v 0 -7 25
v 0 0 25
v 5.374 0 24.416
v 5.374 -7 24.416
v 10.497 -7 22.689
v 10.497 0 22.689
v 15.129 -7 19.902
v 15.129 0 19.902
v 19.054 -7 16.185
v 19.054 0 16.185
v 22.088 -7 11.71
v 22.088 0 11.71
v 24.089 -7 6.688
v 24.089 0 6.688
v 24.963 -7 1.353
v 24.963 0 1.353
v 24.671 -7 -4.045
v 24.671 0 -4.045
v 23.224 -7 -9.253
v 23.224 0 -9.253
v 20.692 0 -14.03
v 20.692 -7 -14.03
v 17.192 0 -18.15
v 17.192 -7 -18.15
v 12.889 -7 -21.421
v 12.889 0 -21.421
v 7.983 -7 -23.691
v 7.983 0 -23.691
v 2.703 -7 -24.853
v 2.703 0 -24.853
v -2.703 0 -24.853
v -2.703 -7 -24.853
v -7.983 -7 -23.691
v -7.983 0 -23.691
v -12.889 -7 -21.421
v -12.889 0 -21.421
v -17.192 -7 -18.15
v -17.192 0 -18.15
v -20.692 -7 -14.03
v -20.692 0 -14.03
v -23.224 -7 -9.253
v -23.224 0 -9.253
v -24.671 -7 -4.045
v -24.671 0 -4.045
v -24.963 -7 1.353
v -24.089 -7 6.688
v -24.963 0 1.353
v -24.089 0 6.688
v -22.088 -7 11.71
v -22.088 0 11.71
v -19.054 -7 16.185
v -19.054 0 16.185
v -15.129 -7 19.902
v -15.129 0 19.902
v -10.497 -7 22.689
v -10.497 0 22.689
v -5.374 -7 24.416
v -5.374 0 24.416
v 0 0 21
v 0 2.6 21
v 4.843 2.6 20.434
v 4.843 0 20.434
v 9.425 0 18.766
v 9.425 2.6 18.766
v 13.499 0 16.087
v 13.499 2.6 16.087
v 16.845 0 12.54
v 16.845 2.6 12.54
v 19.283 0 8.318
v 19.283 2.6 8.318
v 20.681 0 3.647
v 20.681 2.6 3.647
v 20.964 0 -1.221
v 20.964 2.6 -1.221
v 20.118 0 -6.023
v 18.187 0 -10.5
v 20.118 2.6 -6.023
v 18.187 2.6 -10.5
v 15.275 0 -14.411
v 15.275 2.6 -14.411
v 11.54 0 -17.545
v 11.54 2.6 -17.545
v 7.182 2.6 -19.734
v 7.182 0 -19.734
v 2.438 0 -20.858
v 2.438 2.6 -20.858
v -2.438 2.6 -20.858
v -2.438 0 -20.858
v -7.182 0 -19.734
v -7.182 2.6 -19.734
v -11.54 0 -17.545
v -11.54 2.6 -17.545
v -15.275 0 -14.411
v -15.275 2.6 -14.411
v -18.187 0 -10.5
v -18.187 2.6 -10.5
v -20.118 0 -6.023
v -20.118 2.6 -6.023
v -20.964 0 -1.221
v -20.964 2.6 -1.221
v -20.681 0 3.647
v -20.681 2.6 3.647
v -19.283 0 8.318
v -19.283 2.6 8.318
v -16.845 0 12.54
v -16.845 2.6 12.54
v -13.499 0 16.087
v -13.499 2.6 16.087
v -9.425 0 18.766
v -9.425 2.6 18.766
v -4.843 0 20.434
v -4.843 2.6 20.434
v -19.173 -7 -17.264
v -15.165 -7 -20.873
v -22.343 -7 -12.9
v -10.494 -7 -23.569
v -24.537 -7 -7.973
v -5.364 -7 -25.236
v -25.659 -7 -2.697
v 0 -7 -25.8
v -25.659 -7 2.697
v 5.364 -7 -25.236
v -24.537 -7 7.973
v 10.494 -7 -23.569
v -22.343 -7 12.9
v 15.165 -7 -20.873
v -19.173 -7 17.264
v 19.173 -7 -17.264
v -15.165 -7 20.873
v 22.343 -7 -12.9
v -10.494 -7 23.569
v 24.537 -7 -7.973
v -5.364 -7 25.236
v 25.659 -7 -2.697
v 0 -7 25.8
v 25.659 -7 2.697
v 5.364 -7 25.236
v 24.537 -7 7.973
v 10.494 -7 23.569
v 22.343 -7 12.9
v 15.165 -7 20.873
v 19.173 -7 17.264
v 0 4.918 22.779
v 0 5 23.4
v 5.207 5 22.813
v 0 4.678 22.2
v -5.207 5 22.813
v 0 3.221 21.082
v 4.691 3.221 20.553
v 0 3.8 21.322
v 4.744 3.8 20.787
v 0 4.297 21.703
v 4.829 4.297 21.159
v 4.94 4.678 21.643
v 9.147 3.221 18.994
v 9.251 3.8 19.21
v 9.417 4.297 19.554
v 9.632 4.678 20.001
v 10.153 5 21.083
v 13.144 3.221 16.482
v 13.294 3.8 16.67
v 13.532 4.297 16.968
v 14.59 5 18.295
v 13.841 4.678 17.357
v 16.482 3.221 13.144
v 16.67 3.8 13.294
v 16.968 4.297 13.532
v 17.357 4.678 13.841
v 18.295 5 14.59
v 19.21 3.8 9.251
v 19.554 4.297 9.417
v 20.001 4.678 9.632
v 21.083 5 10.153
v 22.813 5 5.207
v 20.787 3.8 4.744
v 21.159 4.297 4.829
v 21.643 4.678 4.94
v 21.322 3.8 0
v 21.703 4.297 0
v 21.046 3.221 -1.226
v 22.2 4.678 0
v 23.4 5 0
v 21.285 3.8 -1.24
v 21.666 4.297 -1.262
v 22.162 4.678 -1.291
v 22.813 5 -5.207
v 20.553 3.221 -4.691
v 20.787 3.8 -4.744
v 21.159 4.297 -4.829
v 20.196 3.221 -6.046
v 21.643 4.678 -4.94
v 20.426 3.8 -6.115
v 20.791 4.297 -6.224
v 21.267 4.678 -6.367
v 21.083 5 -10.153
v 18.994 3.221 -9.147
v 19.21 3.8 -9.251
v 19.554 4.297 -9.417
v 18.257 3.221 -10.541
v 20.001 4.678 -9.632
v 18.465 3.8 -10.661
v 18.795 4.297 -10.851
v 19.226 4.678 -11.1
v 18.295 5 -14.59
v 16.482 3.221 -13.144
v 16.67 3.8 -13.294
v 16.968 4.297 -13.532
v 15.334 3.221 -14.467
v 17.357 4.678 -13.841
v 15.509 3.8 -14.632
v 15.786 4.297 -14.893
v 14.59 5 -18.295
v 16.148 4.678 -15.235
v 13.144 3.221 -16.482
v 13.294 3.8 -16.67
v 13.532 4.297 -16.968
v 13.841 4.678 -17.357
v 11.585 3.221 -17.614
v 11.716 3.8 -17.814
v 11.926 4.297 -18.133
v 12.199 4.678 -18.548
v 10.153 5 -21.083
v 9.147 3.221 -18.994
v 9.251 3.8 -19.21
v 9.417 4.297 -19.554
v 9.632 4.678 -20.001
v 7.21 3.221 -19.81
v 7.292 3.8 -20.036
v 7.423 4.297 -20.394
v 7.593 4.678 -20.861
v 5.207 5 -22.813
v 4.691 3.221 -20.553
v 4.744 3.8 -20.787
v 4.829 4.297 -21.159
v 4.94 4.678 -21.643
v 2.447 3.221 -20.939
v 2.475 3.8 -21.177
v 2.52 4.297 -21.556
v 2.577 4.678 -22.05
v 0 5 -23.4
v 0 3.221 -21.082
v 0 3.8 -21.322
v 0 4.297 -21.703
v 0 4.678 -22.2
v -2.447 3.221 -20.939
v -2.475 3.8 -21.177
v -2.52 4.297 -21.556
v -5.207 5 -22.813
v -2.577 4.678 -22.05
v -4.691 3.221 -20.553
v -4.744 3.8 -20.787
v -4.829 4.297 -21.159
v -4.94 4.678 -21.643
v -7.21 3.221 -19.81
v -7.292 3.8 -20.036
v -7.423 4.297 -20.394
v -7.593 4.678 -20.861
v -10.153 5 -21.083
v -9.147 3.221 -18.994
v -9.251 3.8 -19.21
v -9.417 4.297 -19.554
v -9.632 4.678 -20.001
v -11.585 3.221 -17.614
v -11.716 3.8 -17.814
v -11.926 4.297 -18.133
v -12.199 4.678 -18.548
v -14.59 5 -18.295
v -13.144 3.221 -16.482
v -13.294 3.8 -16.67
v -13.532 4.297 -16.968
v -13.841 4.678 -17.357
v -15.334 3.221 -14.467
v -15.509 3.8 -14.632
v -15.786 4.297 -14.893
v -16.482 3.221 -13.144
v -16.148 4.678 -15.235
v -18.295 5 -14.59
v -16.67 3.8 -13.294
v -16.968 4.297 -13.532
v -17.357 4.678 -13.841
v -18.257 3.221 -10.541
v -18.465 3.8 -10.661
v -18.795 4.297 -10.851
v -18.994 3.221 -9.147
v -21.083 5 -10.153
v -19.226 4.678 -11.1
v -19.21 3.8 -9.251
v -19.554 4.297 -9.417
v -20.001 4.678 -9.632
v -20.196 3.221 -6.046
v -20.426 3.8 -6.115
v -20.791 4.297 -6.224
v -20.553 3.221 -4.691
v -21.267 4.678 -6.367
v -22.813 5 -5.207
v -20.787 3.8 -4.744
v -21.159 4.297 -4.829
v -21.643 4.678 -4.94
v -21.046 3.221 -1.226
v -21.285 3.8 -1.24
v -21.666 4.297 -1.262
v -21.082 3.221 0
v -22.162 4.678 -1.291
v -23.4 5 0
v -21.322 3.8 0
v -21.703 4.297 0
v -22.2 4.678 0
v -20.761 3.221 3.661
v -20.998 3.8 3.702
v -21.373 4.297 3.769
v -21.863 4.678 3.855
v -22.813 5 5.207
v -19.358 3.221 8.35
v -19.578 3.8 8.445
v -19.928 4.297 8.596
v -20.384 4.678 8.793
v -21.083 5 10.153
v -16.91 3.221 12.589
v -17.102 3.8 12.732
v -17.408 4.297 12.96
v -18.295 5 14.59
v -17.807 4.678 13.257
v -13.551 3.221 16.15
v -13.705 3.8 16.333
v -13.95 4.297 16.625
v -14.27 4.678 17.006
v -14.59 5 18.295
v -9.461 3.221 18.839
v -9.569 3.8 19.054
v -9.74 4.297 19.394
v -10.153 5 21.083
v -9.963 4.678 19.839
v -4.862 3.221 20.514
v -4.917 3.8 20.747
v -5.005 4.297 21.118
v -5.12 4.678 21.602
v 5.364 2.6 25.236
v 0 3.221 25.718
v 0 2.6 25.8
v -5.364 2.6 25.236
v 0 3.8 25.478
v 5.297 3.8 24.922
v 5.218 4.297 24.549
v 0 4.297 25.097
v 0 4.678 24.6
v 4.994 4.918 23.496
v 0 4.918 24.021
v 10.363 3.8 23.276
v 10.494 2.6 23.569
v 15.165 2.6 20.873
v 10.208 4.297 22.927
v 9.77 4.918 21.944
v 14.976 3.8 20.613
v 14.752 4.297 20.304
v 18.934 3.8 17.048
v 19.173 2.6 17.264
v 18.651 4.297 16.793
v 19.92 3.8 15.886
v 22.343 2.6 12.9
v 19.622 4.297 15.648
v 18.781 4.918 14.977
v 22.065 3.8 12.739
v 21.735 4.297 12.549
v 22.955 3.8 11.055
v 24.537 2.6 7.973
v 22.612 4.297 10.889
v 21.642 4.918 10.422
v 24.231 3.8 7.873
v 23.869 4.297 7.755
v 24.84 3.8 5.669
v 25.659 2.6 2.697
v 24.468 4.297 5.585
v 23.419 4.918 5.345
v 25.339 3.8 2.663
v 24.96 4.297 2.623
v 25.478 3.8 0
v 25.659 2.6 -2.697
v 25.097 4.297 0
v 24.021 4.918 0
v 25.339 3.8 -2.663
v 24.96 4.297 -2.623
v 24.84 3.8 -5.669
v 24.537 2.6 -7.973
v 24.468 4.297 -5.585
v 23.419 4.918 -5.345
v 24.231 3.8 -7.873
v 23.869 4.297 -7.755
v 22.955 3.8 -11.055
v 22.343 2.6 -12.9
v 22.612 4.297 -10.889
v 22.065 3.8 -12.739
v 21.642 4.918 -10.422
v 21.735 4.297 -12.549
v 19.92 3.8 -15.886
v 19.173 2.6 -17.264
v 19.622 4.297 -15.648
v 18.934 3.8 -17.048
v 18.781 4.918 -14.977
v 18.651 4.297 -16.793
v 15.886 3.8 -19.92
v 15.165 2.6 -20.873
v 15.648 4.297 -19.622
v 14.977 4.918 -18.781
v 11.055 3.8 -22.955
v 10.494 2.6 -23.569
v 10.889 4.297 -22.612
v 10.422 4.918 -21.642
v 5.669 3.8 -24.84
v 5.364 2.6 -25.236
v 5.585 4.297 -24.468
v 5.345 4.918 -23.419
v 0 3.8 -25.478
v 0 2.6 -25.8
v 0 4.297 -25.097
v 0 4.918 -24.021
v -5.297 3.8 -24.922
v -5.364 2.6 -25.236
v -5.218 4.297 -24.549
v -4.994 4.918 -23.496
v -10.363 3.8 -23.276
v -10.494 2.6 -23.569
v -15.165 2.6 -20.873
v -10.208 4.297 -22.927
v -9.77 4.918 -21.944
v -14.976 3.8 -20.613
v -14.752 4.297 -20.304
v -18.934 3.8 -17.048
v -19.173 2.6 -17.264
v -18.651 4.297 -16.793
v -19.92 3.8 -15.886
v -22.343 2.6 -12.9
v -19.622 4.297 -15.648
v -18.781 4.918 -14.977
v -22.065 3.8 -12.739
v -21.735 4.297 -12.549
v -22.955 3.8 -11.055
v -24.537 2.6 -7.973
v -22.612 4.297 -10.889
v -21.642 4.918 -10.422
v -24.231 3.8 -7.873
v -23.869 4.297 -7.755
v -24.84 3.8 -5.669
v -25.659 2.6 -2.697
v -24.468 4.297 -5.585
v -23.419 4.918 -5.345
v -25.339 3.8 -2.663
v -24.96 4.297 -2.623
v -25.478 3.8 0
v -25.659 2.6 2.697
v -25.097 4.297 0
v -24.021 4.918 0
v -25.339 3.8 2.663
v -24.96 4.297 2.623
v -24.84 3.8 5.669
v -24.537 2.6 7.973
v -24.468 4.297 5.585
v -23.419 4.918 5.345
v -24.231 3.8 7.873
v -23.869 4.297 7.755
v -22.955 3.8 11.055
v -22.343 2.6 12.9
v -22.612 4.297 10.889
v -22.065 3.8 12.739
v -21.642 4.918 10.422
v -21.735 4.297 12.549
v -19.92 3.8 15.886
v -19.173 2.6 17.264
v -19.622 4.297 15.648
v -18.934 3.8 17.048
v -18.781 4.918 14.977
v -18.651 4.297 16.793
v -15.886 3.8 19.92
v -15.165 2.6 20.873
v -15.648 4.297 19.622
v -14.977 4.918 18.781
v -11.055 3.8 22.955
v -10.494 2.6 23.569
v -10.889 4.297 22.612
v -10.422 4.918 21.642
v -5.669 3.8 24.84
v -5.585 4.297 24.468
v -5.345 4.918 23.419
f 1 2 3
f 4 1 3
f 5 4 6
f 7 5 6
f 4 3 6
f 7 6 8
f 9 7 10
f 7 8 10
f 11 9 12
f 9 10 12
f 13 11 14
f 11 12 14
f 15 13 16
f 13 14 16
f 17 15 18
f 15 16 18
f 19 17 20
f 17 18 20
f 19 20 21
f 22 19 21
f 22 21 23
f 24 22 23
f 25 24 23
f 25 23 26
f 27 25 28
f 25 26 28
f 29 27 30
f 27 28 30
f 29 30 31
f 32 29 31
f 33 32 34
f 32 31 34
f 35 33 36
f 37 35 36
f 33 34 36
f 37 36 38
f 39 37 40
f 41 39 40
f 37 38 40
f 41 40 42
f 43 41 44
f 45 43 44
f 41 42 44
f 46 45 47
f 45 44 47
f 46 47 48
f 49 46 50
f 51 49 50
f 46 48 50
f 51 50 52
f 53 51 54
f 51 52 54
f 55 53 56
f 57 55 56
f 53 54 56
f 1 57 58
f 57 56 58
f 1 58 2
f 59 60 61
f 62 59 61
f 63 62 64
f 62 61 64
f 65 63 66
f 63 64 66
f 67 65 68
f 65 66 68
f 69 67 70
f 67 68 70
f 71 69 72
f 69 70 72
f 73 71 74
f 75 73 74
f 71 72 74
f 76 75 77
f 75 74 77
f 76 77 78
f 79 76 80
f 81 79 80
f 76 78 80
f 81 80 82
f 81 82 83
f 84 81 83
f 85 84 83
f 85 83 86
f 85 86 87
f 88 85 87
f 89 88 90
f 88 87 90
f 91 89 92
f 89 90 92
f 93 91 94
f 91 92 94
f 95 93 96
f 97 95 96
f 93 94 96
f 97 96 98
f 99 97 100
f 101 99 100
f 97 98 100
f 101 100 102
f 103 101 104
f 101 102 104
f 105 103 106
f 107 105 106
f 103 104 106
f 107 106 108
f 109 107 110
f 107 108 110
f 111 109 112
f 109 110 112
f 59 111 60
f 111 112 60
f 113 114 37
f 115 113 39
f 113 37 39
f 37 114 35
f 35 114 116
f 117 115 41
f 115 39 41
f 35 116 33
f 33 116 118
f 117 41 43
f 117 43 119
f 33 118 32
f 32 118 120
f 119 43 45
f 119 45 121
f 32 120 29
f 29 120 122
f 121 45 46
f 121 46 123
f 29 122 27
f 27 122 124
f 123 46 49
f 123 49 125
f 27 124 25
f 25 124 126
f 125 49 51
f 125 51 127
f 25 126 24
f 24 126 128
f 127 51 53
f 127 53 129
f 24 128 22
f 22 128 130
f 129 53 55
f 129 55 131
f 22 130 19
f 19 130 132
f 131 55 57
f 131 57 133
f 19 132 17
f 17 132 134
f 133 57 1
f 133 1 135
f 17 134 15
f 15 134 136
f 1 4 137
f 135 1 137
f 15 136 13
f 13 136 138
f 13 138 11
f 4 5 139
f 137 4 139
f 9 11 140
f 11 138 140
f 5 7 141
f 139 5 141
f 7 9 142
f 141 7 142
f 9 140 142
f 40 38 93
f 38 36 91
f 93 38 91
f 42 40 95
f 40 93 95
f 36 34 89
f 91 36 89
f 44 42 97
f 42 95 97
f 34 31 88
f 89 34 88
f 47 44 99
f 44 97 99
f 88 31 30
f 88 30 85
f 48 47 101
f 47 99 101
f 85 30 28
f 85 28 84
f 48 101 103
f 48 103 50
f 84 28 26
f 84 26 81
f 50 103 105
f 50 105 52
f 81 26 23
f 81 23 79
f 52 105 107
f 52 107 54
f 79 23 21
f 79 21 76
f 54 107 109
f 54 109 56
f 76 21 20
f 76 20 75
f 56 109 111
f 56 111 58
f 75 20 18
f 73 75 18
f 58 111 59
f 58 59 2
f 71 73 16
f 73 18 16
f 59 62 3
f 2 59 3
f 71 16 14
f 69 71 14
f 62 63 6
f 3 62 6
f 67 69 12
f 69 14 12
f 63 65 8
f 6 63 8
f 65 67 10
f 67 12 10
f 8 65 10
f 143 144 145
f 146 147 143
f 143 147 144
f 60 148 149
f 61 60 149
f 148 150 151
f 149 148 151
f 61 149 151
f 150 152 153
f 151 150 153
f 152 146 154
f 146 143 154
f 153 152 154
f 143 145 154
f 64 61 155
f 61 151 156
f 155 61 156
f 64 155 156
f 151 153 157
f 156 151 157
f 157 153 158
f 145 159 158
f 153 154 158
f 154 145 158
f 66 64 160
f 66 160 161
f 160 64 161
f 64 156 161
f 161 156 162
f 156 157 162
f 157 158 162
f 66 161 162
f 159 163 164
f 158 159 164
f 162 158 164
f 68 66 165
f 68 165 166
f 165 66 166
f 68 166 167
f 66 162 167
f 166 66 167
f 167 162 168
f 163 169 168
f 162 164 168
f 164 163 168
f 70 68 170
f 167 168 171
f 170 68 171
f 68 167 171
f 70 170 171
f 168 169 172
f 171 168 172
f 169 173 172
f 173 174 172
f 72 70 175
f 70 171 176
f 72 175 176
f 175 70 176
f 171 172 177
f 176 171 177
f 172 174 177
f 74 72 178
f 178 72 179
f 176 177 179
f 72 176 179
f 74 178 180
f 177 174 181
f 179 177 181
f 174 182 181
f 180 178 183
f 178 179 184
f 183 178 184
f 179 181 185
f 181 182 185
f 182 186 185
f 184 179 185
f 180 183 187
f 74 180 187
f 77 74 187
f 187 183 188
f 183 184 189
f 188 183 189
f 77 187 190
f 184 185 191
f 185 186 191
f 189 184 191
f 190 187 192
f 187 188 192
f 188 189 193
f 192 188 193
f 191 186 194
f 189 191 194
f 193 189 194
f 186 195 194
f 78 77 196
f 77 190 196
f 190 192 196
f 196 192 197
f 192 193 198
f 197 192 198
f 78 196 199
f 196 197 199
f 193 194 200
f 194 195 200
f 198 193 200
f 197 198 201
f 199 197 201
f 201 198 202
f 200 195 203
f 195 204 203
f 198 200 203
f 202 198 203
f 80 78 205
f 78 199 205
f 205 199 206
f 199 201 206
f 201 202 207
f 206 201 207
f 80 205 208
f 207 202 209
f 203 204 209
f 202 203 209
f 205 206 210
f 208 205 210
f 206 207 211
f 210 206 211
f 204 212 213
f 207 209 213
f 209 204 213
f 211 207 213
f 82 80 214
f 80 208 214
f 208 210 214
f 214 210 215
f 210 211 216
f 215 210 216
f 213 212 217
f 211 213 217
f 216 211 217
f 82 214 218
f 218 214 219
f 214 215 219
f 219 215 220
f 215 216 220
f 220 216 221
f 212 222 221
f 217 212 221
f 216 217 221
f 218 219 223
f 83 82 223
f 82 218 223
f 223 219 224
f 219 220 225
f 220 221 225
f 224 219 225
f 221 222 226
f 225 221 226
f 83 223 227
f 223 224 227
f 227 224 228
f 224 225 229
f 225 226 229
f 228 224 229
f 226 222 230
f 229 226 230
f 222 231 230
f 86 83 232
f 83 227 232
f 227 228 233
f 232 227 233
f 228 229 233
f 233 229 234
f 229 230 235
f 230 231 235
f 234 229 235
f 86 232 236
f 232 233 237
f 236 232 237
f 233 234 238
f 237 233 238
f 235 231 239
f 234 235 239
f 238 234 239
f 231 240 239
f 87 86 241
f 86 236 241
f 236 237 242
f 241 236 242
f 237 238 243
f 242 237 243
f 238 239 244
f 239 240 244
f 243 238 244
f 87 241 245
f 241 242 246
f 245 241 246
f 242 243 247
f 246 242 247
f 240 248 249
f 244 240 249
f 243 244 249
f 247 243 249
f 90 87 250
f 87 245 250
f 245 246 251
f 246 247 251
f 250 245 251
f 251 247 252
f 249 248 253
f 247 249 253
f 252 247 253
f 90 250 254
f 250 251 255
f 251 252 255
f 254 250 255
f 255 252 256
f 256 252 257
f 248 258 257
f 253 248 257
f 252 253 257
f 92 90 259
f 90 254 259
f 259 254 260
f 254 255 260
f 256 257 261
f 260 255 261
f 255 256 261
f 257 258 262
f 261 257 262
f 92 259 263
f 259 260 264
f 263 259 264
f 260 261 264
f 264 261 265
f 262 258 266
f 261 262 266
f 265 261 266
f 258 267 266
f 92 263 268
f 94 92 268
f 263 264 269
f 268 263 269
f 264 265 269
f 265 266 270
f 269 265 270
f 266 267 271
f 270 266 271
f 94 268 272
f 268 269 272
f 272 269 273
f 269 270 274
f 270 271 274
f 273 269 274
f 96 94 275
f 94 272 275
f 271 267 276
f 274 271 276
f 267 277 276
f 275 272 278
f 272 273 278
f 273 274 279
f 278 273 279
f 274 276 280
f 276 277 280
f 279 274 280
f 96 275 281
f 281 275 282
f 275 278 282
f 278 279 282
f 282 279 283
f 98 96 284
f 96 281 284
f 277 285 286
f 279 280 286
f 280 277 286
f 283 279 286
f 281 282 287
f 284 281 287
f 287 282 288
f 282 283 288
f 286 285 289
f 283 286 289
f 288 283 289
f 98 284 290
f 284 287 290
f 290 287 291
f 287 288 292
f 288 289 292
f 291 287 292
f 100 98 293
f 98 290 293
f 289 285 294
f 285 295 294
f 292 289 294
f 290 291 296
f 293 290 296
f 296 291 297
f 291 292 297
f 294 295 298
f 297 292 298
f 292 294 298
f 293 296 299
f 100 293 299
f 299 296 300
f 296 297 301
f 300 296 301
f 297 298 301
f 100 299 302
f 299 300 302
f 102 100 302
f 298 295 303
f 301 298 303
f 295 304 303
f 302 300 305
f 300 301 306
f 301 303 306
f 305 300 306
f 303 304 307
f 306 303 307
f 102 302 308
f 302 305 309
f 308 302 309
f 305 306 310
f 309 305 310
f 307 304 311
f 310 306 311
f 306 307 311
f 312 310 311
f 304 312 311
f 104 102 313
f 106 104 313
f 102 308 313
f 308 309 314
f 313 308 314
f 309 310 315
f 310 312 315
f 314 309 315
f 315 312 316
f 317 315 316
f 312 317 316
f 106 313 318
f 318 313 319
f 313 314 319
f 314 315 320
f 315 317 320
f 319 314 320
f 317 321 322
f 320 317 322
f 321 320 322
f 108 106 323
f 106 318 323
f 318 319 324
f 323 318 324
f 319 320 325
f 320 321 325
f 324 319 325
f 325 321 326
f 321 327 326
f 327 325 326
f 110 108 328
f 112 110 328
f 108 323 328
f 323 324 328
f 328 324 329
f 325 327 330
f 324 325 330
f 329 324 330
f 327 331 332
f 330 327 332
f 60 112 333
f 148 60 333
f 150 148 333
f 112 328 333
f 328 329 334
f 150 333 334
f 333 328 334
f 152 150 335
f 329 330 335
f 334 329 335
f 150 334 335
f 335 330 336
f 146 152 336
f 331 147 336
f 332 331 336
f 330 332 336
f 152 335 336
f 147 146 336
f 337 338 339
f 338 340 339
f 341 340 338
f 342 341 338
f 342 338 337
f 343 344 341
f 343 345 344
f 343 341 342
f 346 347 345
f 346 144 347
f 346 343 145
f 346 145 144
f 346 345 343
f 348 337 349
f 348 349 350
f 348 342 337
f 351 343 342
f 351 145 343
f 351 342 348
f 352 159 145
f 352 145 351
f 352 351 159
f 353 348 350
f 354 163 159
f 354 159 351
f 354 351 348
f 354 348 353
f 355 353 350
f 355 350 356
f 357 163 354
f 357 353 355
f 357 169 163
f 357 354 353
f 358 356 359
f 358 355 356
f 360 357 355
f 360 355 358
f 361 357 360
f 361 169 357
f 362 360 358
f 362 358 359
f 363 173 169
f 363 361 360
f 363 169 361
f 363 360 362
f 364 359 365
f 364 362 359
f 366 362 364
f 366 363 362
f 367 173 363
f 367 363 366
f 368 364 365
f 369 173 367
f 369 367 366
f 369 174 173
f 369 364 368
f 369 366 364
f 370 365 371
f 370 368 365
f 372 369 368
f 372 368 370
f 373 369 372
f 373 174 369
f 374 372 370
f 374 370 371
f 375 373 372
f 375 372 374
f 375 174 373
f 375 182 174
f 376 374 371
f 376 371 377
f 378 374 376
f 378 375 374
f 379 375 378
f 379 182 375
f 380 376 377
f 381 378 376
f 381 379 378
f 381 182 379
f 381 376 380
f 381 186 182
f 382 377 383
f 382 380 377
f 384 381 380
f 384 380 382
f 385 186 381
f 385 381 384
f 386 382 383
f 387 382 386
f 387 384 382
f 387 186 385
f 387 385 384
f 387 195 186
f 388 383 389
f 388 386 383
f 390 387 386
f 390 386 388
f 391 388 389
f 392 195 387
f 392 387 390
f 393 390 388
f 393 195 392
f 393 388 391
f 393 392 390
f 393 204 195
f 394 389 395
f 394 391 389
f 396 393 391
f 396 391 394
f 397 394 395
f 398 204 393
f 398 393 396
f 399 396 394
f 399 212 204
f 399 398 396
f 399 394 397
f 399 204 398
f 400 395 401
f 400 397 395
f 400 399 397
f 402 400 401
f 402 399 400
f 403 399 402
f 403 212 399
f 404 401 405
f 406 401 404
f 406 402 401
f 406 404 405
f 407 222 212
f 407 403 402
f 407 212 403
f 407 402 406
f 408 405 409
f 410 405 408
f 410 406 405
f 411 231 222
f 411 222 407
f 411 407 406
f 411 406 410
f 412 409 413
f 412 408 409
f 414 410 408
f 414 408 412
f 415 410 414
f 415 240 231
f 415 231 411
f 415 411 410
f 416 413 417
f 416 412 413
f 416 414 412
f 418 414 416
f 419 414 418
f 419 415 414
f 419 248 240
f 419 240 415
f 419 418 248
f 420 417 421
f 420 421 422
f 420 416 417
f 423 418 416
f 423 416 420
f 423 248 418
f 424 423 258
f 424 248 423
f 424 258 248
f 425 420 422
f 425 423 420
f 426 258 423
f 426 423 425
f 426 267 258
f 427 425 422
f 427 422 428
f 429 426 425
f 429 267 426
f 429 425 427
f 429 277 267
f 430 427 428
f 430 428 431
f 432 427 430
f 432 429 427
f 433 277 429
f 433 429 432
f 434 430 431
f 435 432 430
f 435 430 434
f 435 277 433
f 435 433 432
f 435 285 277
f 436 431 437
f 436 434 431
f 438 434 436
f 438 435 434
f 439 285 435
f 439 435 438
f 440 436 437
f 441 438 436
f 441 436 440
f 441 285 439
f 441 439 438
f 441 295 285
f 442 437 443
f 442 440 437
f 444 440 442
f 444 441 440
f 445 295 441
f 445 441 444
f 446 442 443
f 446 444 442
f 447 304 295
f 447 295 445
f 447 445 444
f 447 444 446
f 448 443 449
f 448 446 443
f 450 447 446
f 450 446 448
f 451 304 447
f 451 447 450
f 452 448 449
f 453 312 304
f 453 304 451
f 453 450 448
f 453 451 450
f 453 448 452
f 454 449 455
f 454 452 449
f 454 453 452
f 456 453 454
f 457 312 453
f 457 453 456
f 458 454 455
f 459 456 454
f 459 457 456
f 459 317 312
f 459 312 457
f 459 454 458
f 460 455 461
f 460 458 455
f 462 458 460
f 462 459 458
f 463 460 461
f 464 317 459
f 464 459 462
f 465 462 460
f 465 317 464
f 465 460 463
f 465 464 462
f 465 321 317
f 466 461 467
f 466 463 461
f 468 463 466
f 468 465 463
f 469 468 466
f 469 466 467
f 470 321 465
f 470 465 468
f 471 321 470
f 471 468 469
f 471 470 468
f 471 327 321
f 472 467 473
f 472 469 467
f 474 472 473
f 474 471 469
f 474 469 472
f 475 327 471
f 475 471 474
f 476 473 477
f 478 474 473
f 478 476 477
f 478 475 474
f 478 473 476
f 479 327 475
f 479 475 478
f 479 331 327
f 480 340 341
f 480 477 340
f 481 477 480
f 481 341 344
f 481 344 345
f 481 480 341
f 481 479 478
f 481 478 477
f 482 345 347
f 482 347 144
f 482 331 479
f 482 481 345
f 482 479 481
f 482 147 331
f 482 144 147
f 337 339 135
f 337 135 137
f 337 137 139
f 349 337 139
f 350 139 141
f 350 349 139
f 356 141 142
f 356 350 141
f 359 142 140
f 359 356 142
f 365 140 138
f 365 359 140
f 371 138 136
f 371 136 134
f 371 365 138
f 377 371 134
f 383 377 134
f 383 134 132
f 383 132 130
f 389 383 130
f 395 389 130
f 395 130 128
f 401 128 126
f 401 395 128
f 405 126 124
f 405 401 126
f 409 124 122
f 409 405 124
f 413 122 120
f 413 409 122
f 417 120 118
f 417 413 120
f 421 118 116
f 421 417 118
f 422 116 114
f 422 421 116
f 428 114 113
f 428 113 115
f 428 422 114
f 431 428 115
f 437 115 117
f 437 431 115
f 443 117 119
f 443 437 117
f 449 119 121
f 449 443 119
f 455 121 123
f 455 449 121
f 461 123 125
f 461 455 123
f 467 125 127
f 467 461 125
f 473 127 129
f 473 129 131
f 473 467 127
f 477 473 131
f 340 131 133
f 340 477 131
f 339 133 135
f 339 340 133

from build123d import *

# Parameters (mm, degrees)
SKETCH1_R           = 25.8
SKETCH1_R_2         = 25
BOSS_EXTRUDE1_DEPTH = 7
BOSS_EXTRUDE2_START = 5
SKETCH2_R           = 25.8
SKETCH2_R_2         = 21
BOSS_EXTRUDE2_DEPTH = 5
FILLET3_R           = 2.4


with BuildPart() as part:
    # Sketch1 → Boss-Extrude1 (new body)
    with BuildSketch(Plane(origin=(0, 0, 0), x_dir=(1, 0, 0), z_dir=(0, 1, 0))):
        with Locations(Location((0, 0, 0), (0, 0, 270))):
            Circle(SKETCH1_R)
        with Locations(Location((0, 0, 0), (0, 0, 270))):
            Circle(SKETCH1_R_2, mode=Mode.SUBTRACT)
    extrude(amount=-BOSS_EXTRUDE1_DEPTH)

    # Sketch2 → Boss-Extrude2 (add)
    with BuildSketch(Plane(origin=(0, 0, 0), x_dir=(1, 0, 0), z_dir=(0, 1, 0)).offset(BOSS_EXTRUDE2_START)):
        with Locations(Location((0, 0, 0), (0, 0, 270))):
            Circle(SKETCH2_R)
        with Locations(Location((0, 0, 0), (0, 0, 270))):
            Circle(SKETCH2_R_2, mode=Mode.SUBTRACT)
    extrude(amount=-BOSS_EXTRUDE2_DEPTH)

    # Fillet3
    fillet3_edges = [part.edges().sort_by_distance(p)[0] for p in [
        (0, 5, -25.8),
        (0, 5, -21),
    ]]
    fillet(fillet3_edges, radius=FILLET3_R - 0.0001)  # a hair under: the kernel refuses the full size


solid = part.part
